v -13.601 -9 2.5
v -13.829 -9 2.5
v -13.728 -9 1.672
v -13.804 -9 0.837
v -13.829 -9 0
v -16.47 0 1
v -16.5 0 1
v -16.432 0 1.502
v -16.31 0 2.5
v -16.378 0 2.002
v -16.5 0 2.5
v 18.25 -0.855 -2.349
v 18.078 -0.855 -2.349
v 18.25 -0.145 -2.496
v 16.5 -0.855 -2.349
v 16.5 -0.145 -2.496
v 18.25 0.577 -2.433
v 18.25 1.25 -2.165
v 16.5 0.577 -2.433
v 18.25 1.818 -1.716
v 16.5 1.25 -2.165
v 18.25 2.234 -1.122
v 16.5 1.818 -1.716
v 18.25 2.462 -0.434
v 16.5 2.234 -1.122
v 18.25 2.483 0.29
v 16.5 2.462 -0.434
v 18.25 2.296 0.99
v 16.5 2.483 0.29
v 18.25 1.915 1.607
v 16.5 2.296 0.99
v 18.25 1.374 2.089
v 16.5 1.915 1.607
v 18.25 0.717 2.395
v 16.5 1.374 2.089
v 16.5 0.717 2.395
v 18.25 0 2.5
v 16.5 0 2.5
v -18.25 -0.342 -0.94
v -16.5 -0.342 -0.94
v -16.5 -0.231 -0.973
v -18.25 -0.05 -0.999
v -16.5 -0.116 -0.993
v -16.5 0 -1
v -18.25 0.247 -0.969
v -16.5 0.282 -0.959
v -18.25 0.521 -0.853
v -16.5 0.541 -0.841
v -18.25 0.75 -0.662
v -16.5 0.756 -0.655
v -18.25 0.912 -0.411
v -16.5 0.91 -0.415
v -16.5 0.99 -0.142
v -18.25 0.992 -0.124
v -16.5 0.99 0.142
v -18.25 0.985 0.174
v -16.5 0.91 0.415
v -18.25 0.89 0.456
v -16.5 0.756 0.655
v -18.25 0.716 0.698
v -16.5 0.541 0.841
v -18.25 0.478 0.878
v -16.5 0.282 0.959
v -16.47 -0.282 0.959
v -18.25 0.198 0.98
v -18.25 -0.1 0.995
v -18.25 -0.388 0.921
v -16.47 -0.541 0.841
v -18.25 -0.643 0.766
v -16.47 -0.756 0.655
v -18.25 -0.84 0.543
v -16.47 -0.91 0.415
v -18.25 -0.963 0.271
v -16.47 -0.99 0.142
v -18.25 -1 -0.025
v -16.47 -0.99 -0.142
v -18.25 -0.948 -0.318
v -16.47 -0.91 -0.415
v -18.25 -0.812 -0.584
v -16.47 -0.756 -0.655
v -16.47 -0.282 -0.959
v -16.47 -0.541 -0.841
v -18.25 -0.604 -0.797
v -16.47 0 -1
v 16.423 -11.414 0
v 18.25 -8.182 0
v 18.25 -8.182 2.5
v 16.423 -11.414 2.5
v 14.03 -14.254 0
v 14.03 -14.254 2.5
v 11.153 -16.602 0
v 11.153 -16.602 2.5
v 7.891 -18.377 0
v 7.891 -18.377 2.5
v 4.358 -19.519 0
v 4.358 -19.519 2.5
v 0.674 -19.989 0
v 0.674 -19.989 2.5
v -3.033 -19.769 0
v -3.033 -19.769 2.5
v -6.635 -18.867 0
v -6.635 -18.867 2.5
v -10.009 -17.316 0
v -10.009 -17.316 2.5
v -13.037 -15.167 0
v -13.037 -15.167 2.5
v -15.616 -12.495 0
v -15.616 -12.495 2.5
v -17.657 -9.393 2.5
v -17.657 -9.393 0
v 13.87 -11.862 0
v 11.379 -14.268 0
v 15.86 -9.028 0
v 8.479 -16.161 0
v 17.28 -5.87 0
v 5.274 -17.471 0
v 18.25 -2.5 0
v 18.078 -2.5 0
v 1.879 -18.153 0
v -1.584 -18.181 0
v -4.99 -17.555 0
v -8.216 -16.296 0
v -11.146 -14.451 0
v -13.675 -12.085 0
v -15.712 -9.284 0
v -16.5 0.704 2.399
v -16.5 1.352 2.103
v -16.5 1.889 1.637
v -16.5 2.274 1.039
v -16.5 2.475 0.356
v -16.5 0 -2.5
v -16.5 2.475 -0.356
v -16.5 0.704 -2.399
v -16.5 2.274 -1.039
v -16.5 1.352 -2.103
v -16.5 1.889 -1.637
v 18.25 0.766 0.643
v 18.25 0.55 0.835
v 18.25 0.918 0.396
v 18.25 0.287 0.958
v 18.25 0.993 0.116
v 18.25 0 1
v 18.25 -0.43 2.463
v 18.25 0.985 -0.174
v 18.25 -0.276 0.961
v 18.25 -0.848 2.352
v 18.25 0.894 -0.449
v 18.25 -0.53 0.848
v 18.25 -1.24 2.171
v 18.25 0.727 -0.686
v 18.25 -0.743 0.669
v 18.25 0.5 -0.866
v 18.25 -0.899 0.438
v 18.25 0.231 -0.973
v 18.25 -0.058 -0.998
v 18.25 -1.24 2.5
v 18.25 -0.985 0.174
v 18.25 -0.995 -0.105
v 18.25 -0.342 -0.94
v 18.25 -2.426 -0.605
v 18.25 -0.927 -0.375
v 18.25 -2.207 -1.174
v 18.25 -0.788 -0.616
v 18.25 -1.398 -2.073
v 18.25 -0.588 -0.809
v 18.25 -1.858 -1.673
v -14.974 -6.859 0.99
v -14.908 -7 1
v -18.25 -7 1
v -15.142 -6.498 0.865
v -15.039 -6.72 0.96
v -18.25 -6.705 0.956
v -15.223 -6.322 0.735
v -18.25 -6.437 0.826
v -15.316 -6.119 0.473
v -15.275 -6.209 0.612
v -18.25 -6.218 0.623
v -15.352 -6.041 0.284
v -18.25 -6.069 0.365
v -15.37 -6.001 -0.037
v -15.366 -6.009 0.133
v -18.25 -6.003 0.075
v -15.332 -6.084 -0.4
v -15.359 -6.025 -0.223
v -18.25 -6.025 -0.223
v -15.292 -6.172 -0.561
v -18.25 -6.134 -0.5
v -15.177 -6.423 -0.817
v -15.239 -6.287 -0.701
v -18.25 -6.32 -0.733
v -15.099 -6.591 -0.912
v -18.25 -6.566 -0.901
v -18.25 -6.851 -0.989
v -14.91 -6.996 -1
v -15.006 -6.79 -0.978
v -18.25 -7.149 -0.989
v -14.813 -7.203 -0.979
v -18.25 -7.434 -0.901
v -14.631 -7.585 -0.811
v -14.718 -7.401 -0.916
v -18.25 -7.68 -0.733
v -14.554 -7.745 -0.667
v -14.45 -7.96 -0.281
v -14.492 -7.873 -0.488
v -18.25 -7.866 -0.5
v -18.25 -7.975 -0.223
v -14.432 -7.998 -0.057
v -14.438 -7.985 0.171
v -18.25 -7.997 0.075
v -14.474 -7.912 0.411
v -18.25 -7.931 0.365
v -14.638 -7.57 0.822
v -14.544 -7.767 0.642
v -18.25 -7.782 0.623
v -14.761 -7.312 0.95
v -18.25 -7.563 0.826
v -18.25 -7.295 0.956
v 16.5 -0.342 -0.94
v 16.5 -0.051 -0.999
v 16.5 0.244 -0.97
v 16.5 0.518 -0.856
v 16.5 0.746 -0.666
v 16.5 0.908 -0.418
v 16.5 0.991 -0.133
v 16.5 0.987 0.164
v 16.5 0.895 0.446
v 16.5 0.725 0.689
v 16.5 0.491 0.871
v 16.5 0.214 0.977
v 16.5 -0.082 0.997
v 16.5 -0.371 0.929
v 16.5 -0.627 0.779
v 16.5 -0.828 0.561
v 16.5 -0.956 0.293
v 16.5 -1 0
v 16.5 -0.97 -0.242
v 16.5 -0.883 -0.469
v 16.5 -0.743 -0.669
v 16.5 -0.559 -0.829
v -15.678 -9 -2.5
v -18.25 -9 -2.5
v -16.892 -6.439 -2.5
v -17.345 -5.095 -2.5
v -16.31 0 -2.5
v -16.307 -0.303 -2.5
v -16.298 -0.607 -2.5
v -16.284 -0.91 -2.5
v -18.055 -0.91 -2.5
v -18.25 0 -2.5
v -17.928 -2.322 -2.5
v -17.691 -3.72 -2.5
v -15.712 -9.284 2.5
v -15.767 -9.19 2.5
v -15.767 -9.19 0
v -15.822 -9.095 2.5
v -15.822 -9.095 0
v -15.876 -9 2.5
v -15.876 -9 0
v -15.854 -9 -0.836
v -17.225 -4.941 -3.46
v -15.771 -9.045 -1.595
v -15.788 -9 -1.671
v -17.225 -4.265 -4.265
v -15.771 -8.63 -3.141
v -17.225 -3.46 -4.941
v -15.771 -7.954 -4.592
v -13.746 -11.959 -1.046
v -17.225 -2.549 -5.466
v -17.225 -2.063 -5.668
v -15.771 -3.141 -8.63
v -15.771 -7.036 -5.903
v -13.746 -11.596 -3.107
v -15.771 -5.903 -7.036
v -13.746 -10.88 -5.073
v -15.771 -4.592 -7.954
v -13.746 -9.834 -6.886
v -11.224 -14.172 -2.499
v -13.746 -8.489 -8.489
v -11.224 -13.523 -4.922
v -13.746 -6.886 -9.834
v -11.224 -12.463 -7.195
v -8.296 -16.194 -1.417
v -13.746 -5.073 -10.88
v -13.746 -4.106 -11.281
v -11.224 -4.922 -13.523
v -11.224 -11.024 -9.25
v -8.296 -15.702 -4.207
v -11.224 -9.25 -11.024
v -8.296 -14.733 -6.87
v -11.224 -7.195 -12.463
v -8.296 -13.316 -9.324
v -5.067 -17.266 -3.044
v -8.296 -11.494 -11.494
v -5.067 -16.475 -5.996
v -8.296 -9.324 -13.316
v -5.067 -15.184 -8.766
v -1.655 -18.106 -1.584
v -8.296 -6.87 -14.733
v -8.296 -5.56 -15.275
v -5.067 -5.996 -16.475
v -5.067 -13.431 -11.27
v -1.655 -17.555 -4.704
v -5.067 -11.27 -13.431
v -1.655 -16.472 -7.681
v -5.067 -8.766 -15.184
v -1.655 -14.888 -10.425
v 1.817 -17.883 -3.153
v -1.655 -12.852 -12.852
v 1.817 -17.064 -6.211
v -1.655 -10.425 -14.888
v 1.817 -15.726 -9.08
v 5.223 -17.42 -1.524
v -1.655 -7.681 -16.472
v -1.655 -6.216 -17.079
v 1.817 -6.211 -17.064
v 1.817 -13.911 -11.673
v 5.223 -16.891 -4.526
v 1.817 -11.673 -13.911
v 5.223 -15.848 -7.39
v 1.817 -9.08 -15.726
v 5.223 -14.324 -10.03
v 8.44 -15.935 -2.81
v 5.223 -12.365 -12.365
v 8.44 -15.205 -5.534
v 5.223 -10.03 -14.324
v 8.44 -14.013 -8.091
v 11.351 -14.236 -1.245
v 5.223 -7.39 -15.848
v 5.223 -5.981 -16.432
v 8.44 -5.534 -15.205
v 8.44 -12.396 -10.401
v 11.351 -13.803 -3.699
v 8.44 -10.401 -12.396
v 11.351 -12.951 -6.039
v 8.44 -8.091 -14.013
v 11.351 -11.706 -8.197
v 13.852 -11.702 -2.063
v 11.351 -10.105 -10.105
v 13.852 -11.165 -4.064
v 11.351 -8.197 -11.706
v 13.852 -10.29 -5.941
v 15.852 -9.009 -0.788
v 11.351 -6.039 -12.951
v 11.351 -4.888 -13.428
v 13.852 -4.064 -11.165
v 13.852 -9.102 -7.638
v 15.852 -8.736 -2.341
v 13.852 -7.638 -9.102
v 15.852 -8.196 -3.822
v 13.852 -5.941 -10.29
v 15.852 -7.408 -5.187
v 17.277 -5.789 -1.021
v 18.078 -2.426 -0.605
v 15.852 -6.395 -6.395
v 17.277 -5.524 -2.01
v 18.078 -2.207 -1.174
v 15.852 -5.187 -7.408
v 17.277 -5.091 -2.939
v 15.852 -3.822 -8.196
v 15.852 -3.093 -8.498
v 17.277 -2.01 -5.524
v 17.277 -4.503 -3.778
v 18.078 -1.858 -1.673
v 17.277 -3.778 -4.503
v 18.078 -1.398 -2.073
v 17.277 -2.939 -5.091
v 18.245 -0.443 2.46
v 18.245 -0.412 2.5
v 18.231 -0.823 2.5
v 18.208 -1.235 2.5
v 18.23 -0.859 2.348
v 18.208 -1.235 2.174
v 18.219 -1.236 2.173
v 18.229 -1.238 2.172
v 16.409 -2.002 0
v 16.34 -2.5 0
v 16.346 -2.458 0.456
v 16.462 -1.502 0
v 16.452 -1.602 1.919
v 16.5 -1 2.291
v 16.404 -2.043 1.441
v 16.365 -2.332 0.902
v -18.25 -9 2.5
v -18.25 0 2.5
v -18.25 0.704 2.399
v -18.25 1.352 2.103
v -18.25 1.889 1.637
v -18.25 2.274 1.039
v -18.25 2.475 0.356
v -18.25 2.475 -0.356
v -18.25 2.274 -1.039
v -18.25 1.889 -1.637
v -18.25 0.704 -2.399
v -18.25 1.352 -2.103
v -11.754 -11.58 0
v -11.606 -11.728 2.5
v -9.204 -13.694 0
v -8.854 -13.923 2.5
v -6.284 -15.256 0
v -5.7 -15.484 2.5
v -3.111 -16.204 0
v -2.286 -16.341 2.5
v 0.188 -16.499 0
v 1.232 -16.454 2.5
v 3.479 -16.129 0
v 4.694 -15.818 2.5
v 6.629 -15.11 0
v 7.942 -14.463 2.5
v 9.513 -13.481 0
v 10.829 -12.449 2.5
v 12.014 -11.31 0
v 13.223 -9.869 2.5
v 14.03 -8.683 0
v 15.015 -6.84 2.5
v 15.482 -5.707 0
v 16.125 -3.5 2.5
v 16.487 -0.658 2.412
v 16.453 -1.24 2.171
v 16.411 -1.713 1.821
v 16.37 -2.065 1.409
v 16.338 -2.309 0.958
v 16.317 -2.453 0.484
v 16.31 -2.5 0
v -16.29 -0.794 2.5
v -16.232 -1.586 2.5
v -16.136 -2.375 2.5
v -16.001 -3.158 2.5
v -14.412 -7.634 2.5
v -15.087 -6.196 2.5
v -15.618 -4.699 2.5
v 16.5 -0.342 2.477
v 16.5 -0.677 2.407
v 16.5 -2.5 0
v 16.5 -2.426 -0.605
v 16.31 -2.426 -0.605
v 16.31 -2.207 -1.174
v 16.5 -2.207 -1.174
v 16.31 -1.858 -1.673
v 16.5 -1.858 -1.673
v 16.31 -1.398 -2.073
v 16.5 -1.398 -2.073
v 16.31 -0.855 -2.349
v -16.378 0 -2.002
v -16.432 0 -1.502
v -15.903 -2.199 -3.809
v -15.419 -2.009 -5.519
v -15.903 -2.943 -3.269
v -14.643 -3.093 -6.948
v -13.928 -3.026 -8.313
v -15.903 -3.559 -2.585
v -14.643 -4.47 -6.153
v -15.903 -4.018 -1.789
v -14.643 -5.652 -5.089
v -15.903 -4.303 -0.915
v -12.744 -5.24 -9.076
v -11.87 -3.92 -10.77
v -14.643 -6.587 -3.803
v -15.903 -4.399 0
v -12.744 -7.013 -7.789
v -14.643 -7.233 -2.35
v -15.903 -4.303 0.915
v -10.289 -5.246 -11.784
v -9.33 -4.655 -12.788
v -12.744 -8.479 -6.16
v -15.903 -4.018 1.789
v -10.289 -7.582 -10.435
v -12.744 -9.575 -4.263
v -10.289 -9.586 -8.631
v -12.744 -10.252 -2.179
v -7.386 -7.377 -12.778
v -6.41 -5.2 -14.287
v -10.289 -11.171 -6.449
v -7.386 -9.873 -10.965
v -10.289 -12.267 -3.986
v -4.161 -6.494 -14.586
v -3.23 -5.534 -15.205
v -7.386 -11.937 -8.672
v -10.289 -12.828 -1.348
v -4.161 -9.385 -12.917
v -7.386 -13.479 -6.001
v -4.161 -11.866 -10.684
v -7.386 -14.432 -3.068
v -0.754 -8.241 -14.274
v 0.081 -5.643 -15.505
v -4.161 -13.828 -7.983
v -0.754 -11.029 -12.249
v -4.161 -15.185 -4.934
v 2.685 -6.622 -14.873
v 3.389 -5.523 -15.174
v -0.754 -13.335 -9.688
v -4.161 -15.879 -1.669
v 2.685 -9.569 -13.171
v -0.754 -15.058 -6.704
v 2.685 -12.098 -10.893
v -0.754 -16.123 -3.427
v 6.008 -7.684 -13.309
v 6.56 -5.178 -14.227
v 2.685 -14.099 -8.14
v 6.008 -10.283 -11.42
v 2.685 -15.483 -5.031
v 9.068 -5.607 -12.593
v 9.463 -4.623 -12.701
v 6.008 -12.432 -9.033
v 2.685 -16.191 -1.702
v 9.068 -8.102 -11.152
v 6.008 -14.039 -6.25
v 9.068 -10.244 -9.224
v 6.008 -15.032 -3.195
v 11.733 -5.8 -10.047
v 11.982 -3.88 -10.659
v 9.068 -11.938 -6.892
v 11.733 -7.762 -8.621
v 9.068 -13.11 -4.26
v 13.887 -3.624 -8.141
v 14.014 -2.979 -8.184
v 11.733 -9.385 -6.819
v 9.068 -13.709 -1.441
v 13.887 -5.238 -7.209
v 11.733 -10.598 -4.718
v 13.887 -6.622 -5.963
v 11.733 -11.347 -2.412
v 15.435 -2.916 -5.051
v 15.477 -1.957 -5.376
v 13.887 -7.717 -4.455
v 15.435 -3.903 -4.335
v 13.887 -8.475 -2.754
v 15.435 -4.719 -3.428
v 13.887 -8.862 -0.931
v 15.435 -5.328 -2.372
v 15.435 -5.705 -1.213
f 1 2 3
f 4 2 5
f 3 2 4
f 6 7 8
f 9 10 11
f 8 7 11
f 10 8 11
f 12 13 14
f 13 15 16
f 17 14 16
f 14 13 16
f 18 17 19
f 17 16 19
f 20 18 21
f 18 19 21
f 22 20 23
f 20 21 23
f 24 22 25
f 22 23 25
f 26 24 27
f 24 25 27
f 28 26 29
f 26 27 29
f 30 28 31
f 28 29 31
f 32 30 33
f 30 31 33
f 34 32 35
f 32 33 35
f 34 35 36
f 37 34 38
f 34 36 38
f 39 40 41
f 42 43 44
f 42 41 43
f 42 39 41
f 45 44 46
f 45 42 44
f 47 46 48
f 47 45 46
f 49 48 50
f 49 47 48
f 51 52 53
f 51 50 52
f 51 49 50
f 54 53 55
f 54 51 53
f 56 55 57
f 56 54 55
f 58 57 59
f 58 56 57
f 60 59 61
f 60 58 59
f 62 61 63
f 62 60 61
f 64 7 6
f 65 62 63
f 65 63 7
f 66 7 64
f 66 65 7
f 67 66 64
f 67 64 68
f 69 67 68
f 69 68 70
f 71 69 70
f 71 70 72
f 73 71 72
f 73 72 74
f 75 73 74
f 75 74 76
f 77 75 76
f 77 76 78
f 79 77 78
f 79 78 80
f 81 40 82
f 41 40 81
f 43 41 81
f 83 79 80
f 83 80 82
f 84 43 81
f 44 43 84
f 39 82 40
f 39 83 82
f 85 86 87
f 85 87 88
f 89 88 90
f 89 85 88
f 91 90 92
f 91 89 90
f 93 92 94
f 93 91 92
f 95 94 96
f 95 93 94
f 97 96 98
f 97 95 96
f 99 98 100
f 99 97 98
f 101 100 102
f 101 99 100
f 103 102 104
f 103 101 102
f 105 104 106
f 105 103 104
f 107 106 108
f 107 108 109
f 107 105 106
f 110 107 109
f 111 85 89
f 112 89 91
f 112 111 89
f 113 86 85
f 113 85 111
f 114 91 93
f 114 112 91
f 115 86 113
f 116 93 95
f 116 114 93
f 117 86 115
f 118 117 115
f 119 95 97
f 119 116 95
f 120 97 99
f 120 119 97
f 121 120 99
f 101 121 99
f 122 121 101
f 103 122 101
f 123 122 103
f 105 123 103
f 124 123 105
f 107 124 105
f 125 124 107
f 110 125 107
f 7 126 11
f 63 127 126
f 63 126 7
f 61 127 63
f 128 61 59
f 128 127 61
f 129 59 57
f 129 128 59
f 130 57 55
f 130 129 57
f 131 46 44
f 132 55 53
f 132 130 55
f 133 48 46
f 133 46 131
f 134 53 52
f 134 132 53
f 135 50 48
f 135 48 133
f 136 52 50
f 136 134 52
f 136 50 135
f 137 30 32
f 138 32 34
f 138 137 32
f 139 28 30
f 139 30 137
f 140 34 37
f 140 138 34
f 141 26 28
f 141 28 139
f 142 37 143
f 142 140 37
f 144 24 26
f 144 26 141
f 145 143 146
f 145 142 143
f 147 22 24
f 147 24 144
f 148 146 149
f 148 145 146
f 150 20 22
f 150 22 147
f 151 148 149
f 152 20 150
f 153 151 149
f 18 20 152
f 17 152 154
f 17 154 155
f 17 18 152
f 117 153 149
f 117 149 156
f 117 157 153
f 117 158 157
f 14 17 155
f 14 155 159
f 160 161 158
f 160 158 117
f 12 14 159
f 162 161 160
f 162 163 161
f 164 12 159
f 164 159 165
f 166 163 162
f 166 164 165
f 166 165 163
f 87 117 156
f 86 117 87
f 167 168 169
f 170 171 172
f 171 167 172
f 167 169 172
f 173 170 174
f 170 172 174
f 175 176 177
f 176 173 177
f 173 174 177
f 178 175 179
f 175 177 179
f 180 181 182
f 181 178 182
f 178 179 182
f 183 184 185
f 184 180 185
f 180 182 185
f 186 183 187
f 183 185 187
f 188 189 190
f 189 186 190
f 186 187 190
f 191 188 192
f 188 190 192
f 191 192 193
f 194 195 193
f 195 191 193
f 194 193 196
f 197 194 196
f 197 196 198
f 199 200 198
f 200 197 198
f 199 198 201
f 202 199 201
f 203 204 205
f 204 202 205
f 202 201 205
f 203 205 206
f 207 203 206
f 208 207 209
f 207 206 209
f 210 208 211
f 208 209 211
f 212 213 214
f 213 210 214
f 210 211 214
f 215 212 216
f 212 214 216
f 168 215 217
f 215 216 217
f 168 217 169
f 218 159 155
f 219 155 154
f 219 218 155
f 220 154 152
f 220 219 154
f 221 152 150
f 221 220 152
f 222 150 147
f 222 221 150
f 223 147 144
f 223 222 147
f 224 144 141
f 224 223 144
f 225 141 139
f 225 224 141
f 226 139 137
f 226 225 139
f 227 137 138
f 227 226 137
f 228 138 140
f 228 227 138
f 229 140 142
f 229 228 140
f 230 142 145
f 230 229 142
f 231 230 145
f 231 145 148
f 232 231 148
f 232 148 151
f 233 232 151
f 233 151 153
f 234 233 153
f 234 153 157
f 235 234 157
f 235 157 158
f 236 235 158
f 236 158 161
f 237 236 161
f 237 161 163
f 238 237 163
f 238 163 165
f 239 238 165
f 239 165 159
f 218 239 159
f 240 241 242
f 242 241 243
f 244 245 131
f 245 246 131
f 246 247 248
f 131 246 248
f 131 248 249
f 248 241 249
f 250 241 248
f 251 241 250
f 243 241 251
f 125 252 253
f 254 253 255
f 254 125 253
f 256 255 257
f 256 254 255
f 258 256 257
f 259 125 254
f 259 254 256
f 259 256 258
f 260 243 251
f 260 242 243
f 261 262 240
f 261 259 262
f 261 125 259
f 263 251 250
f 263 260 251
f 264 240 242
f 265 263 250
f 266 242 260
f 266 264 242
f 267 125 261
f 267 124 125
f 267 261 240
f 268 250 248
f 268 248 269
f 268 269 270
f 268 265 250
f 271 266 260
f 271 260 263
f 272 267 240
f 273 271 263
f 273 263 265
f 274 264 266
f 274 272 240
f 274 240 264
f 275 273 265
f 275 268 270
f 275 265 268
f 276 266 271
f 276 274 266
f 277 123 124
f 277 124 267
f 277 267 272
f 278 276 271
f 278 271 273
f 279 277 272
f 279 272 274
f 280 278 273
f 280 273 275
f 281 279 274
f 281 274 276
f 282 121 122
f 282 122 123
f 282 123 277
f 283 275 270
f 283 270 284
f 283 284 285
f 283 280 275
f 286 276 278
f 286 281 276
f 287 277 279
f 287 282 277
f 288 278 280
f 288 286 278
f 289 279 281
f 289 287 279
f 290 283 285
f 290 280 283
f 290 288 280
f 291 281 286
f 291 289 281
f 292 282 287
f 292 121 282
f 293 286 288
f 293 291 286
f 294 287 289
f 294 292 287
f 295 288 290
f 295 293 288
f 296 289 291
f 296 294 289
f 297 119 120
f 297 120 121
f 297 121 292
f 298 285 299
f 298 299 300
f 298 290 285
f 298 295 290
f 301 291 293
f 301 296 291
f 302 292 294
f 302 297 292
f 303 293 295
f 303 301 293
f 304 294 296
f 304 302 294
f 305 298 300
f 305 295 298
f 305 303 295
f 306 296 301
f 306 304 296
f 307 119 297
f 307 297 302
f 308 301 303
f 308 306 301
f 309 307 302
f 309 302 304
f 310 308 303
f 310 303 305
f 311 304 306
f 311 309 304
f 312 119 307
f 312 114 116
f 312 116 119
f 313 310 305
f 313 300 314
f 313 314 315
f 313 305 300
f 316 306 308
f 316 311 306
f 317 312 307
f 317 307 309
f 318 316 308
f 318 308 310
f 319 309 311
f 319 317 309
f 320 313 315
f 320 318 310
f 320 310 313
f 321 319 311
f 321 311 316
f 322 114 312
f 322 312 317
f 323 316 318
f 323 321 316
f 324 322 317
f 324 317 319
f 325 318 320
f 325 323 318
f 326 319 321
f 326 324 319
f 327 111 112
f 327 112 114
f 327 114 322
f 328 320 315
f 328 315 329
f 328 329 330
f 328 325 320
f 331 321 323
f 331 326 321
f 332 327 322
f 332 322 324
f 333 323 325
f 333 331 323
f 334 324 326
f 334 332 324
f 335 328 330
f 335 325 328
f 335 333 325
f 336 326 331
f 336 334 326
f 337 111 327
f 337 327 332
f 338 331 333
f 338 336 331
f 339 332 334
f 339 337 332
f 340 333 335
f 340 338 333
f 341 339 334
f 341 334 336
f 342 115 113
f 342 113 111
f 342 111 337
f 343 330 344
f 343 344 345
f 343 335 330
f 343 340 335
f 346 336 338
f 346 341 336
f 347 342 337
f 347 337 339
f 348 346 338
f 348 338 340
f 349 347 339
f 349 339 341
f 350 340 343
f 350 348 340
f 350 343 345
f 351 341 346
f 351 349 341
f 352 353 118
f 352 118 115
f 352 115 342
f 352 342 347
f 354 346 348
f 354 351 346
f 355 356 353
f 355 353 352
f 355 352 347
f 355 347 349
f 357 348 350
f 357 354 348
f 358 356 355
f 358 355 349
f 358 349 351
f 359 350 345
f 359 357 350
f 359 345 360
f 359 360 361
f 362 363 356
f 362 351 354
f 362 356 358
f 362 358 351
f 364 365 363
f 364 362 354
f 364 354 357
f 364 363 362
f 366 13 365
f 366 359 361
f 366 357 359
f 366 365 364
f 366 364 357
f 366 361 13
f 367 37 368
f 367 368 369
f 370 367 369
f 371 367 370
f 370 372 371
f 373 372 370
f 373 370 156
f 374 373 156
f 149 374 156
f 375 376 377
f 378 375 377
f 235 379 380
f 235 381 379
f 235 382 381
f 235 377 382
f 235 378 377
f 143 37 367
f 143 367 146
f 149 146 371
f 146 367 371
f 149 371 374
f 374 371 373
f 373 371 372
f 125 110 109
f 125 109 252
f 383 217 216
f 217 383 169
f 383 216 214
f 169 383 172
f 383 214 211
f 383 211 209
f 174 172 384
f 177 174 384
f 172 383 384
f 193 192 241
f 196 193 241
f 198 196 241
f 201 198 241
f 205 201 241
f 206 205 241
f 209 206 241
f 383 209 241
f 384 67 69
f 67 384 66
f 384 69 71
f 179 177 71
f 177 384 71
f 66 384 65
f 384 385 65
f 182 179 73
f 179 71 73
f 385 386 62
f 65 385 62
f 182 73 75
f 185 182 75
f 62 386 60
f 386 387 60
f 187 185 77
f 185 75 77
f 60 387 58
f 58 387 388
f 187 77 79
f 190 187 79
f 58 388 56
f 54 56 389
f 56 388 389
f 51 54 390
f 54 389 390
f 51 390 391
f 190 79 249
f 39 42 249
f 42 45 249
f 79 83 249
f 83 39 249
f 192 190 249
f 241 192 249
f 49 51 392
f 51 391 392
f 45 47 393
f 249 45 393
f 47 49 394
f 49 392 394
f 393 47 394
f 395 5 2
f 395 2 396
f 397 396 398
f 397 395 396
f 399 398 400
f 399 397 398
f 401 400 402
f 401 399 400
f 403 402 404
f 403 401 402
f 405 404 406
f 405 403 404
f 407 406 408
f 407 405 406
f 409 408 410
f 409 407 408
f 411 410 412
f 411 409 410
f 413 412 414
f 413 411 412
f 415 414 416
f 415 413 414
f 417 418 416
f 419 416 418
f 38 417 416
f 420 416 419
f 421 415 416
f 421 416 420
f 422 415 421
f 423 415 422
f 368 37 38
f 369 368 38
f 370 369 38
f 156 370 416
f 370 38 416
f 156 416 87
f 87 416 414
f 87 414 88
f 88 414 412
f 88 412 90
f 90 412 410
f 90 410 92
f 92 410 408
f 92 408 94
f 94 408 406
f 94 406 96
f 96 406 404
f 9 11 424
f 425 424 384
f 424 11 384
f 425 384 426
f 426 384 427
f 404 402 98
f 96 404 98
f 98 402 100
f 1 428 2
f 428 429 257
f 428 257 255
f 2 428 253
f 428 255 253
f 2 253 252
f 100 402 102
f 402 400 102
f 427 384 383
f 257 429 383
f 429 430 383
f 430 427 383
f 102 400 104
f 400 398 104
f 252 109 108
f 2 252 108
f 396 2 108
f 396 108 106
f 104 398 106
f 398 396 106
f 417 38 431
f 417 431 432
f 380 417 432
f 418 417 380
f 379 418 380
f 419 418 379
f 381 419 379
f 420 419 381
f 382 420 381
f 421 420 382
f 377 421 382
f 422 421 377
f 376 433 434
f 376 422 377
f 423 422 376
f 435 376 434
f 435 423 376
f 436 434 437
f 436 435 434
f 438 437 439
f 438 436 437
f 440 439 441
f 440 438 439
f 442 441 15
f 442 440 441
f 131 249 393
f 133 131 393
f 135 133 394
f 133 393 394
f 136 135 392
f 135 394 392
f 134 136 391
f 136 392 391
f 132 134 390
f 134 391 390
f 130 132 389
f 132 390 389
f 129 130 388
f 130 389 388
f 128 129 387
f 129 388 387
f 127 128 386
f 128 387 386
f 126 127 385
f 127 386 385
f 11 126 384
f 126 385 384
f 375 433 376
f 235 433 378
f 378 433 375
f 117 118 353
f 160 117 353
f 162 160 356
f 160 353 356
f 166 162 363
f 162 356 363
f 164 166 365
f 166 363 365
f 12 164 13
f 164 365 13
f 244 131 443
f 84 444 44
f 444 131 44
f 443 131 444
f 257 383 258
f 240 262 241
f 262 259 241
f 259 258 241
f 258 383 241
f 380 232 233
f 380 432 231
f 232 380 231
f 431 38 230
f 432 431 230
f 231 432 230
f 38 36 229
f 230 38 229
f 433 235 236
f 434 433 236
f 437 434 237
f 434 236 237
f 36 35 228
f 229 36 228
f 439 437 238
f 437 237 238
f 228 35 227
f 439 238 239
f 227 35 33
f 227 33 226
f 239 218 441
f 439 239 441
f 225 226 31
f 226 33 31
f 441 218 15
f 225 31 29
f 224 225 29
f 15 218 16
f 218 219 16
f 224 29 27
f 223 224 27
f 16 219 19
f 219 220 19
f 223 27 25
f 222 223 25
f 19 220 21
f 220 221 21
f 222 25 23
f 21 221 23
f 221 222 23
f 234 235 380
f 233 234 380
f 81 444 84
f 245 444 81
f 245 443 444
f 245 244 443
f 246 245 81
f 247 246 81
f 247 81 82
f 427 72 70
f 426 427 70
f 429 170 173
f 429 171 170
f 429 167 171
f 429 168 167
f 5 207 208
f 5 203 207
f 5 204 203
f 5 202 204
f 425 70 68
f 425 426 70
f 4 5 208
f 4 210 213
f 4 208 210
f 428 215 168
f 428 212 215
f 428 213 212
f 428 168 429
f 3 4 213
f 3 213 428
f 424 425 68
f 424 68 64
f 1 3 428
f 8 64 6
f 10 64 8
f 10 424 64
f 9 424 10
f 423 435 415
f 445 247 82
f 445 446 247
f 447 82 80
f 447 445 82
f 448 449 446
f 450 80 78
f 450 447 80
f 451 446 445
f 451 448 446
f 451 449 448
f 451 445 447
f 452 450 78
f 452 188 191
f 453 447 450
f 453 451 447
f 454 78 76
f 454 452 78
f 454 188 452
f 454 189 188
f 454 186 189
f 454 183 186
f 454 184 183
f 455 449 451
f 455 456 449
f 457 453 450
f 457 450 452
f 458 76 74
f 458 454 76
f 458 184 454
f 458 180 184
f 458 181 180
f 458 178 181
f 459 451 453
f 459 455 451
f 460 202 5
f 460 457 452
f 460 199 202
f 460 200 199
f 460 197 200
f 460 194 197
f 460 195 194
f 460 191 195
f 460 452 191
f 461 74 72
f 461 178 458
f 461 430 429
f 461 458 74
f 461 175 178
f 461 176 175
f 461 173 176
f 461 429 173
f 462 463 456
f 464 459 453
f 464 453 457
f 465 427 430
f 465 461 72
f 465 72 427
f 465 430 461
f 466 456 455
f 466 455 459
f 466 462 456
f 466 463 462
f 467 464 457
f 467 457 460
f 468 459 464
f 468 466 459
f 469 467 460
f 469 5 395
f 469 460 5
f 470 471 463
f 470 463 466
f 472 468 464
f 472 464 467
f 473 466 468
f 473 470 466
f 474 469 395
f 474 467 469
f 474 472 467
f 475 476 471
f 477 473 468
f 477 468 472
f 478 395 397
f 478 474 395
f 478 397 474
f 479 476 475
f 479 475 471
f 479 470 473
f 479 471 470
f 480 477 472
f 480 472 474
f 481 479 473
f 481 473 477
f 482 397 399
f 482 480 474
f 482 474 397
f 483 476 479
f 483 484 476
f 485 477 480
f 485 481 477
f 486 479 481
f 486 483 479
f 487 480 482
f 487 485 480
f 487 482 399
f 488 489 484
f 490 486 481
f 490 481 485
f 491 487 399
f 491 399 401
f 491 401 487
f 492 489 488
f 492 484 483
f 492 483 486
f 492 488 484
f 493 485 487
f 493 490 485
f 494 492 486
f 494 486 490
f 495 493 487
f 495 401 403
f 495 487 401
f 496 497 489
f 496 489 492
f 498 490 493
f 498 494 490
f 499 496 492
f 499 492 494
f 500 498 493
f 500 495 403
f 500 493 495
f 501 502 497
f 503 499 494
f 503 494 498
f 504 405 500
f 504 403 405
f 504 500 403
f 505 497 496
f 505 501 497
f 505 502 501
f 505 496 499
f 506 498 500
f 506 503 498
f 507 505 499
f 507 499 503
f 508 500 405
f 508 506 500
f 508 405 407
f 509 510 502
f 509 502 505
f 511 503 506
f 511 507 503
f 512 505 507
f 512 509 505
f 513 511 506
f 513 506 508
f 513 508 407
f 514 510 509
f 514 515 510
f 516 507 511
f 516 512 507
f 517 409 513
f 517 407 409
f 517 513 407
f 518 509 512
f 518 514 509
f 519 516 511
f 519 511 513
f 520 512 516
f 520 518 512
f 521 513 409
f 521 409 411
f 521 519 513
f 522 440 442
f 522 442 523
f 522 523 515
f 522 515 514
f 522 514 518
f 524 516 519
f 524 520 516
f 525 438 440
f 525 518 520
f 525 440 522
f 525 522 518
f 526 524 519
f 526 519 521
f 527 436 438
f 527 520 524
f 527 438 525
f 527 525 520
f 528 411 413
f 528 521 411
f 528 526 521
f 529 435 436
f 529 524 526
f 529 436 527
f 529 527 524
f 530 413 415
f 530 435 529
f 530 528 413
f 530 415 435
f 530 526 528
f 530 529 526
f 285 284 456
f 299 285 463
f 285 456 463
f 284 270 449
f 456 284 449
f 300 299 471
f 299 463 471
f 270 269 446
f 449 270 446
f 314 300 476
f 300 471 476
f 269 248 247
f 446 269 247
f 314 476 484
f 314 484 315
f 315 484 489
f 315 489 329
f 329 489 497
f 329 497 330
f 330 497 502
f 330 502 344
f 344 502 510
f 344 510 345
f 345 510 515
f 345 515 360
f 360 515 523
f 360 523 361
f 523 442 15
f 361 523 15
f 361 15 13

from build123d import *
from build123d.topology import SkipClean

# Parameters (mm, degrees)
EXTRUDE_1_DEPTH          = 2.5
REVOLVE_1_ANGLE          = 70
EXTRUDE_2_DEPTH          = 18.25
EXTRUDE_2_DEPTH_BACK     = 18.25
SKETCH_4_R               = 2.5
SKETCH_4_R_2             = 1
CUT_EXTRUDE_1_DEPTH      = 16.5
CUT_EXTRUDE_1_DEPTH_BACK = 16.5
SKETCH_7_R               = 2.5
SKETCH_7_R_2             = 1
CUT_EXTRUDE_2_DEPTH      = 100
CUT_EXTRUDE_2_DEPTH_BACK = 100
SKETCH_8_R               = 1
EXTRUDE_START            = -5
SKETCH_9_R               = 1
EXTRUDE_3_DEPTH          = 5
CUT_EXTRUDE_START        = -5
SKETCH_12_R              = 1
CUT_EXTRUDE_3_DEPTH      = 5
EXTRUDE_4_DEPTH          = 2.5
CUT_EXTRUDE_4_DEPTH      = 2.5


with BuildPart() as part:
    # 草图1 → 凸台-拉伸1 (new body)
    with BuildSketch(Plane.XY):
        with BuildLine():
            Line((-18.25, 0), (-16.5, 0))
            ThreePointArc((-16.5, 0), (0, -16.5), (16.5, 0))
            Line((16.5, 0), (18.25, 0))
            ThreePointArc((18.25, 0), (0, -18.25), (-18.25, 0))
        make_face()
    extrude(amount=EXTRUDE_1_DEPTH)

    # 草图2 → 旋转1 (revolve)
    with BuildSketch(Plane(origin=(0, 0, 0), x_dir=(-1, 0, 0), z_dir=(0, 0, -1))):
        with BuildLine():
            Line((-17.375, 0), (-16.5, 0))
            ThreePointArc((-16.5, 0), (0, -16.5), (16.5, 0))
            Line((16.5, 0), (17.375, 0))
            Line((17.375, 0), (18.25, 0))
            ThreePointArc((18.25, 0), (0, -18.25), (-18.25, 0))
            Line((-18.25, 0), (-17.375, 0))
        make_face()
    revolve(axis=Axis((16.5, 0, 0), (1, 0, 0)), revolution_arc=REVOLVE_1_ANGLE)

    # 草图4 → 凸台-拉伸2 (add, two sides: drawn at the far end of the back side and taken through both)
    with BuildSketch(Plane(origin=(0, 0, 0), x_dir=(0, 0, -1), z_dir=(1, 0, 0)).offset(-EXTRUDE_2_DEPTH_BACK)):
        Circle(SKETCH_4_R)
        Circle(SKETCH_4_R_2, mode=Mode.SUBTRACT)
    extrude(amount=EXTRUDE_2_DEPTH + EXTRUDE_2_DEPTH_BACK)

    # 草图7 → 切除-拉伸1 (cut, two sides: drawn at the far end of the back side and taken through both)
    with SkipClean():  # the faces are left unmerged after this step: merging them gives an invalid solid
        with BuildSketch(Plane(origin=(0, 0, 0), x_dir=(0, 0, -1), z_dir=(1, 0, 0)).offset(-CUT_EXTRUDE_1_DEPTH_BACK)):
            Circle(SKETCH_7_R)
            Circle(SKETCH_7_R_2, mode=Mode.SUBTRACT)
        extrude(amount=CUT_EXTRUDE_1_DEPTH + CUT_EXTRUDE_1_DEPTH_BACK, mode=Mode.SUBTRACT)

    # 草图8 → 切除-拉伸2 (cut, two sides: drawn at the far end of the back side and taken through both)
    with BuildSketch(Plane(origin=(0, 0, 0), x_dir=(0, 0, -1), z_dir=(1, 0, 0)).offset(-CUT_EXTRUDE_2_DEPTH_BACK)):
        Circle(SKETCH_8_R)
    extrude(amount=CUT_EXTRUDE_2_DEPTH + CUT_EXTRUDE_2_DEPTH_BACK, mode=Mode.SUBTRACT)

    # 草图9 → 凸台-拉伸3 (add)
    with BuildSketch(Plane.ZY.offset(18.25).offset(EXTRUDE_START)):
        with BuildLine():
            Line((1, 0), (2.5, 0))
            Line((2.5, 0), (2.5, -9))
            Line((2.5, -9), (-2.5, -9))
            Line((-2.5, -9), (-2.5, 0))
            Line((-2.5, 0), (-1, 0))
            ThreePointArc((-1, 0), (0, -1), (1, 0))
        make_face()
        with Locations((0, -7)):
            Circle(SKETCH_9_R, mode=Mode.SUBTRACT)
    extrude(amount=EXTRUDE_3_DEPTH)

    # 草图12 → 切除-拉伸3 (cut)
    with BuildSketch(Plane.ZY.offset(18.25).offset(CUT_EXTRUDE_START)):
        with Locations((0, -7)):
            Circle(SKETCH_12_R)
    extrude(amount=CUT_EXTRUDE_3_DEPTH, mode=Mode.SUBTRACT)

    # 草图13 → 切除-旋转1 (revolve, cut)
    with BuildSketch(Plane.XY):
        with BuildLine():
            Line((16.5, 0), (-16.5, 0))
            ThreePointArc((-16.5, 0), (0, -16.5), (16.5, 0))
        make_face()
    revolve(axis=Axis((16.5, 0, 0), (-1, 0, 0)), mode=Mode.SUBTRACT)

    # 草图14 → 凸台-拉伸4 (add)
    with BuildSketch(Plane.XY):
        with BuildLine():
            Line((16.5, -1), (19.945657674, -1.473343123))
            ThreePointArc((19.945657674, -1.473343123), (4.12178771, -19.570663404), (-17.657116061, -9.392883071))
            Line((-17.657116061, -9.392883071), (-13.750126888, -9.175184497))
            ThreePointArc((-13.750126888, -9.175184497), (4.31263967, -15.957792425), (16.5, -1))
        make_face()
    extrude(amount=EXTRUDE_4_DEPTH)

    # 草图15 → 切除-拉伸4 (cut)
    with BuildSketch(Plane(origin=(0, 0, 0), x_dir=(-1, 0, 0), z_dir=(0, 0, -1))):
        Polygon((-19.945657674, -1.473343123), (-18.25, -1.240404168), (-18.25, -11.043121242), (-22.78736169, -5.639500824), align=None)
    extrude(amount=-CUT_EXTRUDE_4_DEPTH, mode=Mode.SUBTRACT)


solid = part.part
